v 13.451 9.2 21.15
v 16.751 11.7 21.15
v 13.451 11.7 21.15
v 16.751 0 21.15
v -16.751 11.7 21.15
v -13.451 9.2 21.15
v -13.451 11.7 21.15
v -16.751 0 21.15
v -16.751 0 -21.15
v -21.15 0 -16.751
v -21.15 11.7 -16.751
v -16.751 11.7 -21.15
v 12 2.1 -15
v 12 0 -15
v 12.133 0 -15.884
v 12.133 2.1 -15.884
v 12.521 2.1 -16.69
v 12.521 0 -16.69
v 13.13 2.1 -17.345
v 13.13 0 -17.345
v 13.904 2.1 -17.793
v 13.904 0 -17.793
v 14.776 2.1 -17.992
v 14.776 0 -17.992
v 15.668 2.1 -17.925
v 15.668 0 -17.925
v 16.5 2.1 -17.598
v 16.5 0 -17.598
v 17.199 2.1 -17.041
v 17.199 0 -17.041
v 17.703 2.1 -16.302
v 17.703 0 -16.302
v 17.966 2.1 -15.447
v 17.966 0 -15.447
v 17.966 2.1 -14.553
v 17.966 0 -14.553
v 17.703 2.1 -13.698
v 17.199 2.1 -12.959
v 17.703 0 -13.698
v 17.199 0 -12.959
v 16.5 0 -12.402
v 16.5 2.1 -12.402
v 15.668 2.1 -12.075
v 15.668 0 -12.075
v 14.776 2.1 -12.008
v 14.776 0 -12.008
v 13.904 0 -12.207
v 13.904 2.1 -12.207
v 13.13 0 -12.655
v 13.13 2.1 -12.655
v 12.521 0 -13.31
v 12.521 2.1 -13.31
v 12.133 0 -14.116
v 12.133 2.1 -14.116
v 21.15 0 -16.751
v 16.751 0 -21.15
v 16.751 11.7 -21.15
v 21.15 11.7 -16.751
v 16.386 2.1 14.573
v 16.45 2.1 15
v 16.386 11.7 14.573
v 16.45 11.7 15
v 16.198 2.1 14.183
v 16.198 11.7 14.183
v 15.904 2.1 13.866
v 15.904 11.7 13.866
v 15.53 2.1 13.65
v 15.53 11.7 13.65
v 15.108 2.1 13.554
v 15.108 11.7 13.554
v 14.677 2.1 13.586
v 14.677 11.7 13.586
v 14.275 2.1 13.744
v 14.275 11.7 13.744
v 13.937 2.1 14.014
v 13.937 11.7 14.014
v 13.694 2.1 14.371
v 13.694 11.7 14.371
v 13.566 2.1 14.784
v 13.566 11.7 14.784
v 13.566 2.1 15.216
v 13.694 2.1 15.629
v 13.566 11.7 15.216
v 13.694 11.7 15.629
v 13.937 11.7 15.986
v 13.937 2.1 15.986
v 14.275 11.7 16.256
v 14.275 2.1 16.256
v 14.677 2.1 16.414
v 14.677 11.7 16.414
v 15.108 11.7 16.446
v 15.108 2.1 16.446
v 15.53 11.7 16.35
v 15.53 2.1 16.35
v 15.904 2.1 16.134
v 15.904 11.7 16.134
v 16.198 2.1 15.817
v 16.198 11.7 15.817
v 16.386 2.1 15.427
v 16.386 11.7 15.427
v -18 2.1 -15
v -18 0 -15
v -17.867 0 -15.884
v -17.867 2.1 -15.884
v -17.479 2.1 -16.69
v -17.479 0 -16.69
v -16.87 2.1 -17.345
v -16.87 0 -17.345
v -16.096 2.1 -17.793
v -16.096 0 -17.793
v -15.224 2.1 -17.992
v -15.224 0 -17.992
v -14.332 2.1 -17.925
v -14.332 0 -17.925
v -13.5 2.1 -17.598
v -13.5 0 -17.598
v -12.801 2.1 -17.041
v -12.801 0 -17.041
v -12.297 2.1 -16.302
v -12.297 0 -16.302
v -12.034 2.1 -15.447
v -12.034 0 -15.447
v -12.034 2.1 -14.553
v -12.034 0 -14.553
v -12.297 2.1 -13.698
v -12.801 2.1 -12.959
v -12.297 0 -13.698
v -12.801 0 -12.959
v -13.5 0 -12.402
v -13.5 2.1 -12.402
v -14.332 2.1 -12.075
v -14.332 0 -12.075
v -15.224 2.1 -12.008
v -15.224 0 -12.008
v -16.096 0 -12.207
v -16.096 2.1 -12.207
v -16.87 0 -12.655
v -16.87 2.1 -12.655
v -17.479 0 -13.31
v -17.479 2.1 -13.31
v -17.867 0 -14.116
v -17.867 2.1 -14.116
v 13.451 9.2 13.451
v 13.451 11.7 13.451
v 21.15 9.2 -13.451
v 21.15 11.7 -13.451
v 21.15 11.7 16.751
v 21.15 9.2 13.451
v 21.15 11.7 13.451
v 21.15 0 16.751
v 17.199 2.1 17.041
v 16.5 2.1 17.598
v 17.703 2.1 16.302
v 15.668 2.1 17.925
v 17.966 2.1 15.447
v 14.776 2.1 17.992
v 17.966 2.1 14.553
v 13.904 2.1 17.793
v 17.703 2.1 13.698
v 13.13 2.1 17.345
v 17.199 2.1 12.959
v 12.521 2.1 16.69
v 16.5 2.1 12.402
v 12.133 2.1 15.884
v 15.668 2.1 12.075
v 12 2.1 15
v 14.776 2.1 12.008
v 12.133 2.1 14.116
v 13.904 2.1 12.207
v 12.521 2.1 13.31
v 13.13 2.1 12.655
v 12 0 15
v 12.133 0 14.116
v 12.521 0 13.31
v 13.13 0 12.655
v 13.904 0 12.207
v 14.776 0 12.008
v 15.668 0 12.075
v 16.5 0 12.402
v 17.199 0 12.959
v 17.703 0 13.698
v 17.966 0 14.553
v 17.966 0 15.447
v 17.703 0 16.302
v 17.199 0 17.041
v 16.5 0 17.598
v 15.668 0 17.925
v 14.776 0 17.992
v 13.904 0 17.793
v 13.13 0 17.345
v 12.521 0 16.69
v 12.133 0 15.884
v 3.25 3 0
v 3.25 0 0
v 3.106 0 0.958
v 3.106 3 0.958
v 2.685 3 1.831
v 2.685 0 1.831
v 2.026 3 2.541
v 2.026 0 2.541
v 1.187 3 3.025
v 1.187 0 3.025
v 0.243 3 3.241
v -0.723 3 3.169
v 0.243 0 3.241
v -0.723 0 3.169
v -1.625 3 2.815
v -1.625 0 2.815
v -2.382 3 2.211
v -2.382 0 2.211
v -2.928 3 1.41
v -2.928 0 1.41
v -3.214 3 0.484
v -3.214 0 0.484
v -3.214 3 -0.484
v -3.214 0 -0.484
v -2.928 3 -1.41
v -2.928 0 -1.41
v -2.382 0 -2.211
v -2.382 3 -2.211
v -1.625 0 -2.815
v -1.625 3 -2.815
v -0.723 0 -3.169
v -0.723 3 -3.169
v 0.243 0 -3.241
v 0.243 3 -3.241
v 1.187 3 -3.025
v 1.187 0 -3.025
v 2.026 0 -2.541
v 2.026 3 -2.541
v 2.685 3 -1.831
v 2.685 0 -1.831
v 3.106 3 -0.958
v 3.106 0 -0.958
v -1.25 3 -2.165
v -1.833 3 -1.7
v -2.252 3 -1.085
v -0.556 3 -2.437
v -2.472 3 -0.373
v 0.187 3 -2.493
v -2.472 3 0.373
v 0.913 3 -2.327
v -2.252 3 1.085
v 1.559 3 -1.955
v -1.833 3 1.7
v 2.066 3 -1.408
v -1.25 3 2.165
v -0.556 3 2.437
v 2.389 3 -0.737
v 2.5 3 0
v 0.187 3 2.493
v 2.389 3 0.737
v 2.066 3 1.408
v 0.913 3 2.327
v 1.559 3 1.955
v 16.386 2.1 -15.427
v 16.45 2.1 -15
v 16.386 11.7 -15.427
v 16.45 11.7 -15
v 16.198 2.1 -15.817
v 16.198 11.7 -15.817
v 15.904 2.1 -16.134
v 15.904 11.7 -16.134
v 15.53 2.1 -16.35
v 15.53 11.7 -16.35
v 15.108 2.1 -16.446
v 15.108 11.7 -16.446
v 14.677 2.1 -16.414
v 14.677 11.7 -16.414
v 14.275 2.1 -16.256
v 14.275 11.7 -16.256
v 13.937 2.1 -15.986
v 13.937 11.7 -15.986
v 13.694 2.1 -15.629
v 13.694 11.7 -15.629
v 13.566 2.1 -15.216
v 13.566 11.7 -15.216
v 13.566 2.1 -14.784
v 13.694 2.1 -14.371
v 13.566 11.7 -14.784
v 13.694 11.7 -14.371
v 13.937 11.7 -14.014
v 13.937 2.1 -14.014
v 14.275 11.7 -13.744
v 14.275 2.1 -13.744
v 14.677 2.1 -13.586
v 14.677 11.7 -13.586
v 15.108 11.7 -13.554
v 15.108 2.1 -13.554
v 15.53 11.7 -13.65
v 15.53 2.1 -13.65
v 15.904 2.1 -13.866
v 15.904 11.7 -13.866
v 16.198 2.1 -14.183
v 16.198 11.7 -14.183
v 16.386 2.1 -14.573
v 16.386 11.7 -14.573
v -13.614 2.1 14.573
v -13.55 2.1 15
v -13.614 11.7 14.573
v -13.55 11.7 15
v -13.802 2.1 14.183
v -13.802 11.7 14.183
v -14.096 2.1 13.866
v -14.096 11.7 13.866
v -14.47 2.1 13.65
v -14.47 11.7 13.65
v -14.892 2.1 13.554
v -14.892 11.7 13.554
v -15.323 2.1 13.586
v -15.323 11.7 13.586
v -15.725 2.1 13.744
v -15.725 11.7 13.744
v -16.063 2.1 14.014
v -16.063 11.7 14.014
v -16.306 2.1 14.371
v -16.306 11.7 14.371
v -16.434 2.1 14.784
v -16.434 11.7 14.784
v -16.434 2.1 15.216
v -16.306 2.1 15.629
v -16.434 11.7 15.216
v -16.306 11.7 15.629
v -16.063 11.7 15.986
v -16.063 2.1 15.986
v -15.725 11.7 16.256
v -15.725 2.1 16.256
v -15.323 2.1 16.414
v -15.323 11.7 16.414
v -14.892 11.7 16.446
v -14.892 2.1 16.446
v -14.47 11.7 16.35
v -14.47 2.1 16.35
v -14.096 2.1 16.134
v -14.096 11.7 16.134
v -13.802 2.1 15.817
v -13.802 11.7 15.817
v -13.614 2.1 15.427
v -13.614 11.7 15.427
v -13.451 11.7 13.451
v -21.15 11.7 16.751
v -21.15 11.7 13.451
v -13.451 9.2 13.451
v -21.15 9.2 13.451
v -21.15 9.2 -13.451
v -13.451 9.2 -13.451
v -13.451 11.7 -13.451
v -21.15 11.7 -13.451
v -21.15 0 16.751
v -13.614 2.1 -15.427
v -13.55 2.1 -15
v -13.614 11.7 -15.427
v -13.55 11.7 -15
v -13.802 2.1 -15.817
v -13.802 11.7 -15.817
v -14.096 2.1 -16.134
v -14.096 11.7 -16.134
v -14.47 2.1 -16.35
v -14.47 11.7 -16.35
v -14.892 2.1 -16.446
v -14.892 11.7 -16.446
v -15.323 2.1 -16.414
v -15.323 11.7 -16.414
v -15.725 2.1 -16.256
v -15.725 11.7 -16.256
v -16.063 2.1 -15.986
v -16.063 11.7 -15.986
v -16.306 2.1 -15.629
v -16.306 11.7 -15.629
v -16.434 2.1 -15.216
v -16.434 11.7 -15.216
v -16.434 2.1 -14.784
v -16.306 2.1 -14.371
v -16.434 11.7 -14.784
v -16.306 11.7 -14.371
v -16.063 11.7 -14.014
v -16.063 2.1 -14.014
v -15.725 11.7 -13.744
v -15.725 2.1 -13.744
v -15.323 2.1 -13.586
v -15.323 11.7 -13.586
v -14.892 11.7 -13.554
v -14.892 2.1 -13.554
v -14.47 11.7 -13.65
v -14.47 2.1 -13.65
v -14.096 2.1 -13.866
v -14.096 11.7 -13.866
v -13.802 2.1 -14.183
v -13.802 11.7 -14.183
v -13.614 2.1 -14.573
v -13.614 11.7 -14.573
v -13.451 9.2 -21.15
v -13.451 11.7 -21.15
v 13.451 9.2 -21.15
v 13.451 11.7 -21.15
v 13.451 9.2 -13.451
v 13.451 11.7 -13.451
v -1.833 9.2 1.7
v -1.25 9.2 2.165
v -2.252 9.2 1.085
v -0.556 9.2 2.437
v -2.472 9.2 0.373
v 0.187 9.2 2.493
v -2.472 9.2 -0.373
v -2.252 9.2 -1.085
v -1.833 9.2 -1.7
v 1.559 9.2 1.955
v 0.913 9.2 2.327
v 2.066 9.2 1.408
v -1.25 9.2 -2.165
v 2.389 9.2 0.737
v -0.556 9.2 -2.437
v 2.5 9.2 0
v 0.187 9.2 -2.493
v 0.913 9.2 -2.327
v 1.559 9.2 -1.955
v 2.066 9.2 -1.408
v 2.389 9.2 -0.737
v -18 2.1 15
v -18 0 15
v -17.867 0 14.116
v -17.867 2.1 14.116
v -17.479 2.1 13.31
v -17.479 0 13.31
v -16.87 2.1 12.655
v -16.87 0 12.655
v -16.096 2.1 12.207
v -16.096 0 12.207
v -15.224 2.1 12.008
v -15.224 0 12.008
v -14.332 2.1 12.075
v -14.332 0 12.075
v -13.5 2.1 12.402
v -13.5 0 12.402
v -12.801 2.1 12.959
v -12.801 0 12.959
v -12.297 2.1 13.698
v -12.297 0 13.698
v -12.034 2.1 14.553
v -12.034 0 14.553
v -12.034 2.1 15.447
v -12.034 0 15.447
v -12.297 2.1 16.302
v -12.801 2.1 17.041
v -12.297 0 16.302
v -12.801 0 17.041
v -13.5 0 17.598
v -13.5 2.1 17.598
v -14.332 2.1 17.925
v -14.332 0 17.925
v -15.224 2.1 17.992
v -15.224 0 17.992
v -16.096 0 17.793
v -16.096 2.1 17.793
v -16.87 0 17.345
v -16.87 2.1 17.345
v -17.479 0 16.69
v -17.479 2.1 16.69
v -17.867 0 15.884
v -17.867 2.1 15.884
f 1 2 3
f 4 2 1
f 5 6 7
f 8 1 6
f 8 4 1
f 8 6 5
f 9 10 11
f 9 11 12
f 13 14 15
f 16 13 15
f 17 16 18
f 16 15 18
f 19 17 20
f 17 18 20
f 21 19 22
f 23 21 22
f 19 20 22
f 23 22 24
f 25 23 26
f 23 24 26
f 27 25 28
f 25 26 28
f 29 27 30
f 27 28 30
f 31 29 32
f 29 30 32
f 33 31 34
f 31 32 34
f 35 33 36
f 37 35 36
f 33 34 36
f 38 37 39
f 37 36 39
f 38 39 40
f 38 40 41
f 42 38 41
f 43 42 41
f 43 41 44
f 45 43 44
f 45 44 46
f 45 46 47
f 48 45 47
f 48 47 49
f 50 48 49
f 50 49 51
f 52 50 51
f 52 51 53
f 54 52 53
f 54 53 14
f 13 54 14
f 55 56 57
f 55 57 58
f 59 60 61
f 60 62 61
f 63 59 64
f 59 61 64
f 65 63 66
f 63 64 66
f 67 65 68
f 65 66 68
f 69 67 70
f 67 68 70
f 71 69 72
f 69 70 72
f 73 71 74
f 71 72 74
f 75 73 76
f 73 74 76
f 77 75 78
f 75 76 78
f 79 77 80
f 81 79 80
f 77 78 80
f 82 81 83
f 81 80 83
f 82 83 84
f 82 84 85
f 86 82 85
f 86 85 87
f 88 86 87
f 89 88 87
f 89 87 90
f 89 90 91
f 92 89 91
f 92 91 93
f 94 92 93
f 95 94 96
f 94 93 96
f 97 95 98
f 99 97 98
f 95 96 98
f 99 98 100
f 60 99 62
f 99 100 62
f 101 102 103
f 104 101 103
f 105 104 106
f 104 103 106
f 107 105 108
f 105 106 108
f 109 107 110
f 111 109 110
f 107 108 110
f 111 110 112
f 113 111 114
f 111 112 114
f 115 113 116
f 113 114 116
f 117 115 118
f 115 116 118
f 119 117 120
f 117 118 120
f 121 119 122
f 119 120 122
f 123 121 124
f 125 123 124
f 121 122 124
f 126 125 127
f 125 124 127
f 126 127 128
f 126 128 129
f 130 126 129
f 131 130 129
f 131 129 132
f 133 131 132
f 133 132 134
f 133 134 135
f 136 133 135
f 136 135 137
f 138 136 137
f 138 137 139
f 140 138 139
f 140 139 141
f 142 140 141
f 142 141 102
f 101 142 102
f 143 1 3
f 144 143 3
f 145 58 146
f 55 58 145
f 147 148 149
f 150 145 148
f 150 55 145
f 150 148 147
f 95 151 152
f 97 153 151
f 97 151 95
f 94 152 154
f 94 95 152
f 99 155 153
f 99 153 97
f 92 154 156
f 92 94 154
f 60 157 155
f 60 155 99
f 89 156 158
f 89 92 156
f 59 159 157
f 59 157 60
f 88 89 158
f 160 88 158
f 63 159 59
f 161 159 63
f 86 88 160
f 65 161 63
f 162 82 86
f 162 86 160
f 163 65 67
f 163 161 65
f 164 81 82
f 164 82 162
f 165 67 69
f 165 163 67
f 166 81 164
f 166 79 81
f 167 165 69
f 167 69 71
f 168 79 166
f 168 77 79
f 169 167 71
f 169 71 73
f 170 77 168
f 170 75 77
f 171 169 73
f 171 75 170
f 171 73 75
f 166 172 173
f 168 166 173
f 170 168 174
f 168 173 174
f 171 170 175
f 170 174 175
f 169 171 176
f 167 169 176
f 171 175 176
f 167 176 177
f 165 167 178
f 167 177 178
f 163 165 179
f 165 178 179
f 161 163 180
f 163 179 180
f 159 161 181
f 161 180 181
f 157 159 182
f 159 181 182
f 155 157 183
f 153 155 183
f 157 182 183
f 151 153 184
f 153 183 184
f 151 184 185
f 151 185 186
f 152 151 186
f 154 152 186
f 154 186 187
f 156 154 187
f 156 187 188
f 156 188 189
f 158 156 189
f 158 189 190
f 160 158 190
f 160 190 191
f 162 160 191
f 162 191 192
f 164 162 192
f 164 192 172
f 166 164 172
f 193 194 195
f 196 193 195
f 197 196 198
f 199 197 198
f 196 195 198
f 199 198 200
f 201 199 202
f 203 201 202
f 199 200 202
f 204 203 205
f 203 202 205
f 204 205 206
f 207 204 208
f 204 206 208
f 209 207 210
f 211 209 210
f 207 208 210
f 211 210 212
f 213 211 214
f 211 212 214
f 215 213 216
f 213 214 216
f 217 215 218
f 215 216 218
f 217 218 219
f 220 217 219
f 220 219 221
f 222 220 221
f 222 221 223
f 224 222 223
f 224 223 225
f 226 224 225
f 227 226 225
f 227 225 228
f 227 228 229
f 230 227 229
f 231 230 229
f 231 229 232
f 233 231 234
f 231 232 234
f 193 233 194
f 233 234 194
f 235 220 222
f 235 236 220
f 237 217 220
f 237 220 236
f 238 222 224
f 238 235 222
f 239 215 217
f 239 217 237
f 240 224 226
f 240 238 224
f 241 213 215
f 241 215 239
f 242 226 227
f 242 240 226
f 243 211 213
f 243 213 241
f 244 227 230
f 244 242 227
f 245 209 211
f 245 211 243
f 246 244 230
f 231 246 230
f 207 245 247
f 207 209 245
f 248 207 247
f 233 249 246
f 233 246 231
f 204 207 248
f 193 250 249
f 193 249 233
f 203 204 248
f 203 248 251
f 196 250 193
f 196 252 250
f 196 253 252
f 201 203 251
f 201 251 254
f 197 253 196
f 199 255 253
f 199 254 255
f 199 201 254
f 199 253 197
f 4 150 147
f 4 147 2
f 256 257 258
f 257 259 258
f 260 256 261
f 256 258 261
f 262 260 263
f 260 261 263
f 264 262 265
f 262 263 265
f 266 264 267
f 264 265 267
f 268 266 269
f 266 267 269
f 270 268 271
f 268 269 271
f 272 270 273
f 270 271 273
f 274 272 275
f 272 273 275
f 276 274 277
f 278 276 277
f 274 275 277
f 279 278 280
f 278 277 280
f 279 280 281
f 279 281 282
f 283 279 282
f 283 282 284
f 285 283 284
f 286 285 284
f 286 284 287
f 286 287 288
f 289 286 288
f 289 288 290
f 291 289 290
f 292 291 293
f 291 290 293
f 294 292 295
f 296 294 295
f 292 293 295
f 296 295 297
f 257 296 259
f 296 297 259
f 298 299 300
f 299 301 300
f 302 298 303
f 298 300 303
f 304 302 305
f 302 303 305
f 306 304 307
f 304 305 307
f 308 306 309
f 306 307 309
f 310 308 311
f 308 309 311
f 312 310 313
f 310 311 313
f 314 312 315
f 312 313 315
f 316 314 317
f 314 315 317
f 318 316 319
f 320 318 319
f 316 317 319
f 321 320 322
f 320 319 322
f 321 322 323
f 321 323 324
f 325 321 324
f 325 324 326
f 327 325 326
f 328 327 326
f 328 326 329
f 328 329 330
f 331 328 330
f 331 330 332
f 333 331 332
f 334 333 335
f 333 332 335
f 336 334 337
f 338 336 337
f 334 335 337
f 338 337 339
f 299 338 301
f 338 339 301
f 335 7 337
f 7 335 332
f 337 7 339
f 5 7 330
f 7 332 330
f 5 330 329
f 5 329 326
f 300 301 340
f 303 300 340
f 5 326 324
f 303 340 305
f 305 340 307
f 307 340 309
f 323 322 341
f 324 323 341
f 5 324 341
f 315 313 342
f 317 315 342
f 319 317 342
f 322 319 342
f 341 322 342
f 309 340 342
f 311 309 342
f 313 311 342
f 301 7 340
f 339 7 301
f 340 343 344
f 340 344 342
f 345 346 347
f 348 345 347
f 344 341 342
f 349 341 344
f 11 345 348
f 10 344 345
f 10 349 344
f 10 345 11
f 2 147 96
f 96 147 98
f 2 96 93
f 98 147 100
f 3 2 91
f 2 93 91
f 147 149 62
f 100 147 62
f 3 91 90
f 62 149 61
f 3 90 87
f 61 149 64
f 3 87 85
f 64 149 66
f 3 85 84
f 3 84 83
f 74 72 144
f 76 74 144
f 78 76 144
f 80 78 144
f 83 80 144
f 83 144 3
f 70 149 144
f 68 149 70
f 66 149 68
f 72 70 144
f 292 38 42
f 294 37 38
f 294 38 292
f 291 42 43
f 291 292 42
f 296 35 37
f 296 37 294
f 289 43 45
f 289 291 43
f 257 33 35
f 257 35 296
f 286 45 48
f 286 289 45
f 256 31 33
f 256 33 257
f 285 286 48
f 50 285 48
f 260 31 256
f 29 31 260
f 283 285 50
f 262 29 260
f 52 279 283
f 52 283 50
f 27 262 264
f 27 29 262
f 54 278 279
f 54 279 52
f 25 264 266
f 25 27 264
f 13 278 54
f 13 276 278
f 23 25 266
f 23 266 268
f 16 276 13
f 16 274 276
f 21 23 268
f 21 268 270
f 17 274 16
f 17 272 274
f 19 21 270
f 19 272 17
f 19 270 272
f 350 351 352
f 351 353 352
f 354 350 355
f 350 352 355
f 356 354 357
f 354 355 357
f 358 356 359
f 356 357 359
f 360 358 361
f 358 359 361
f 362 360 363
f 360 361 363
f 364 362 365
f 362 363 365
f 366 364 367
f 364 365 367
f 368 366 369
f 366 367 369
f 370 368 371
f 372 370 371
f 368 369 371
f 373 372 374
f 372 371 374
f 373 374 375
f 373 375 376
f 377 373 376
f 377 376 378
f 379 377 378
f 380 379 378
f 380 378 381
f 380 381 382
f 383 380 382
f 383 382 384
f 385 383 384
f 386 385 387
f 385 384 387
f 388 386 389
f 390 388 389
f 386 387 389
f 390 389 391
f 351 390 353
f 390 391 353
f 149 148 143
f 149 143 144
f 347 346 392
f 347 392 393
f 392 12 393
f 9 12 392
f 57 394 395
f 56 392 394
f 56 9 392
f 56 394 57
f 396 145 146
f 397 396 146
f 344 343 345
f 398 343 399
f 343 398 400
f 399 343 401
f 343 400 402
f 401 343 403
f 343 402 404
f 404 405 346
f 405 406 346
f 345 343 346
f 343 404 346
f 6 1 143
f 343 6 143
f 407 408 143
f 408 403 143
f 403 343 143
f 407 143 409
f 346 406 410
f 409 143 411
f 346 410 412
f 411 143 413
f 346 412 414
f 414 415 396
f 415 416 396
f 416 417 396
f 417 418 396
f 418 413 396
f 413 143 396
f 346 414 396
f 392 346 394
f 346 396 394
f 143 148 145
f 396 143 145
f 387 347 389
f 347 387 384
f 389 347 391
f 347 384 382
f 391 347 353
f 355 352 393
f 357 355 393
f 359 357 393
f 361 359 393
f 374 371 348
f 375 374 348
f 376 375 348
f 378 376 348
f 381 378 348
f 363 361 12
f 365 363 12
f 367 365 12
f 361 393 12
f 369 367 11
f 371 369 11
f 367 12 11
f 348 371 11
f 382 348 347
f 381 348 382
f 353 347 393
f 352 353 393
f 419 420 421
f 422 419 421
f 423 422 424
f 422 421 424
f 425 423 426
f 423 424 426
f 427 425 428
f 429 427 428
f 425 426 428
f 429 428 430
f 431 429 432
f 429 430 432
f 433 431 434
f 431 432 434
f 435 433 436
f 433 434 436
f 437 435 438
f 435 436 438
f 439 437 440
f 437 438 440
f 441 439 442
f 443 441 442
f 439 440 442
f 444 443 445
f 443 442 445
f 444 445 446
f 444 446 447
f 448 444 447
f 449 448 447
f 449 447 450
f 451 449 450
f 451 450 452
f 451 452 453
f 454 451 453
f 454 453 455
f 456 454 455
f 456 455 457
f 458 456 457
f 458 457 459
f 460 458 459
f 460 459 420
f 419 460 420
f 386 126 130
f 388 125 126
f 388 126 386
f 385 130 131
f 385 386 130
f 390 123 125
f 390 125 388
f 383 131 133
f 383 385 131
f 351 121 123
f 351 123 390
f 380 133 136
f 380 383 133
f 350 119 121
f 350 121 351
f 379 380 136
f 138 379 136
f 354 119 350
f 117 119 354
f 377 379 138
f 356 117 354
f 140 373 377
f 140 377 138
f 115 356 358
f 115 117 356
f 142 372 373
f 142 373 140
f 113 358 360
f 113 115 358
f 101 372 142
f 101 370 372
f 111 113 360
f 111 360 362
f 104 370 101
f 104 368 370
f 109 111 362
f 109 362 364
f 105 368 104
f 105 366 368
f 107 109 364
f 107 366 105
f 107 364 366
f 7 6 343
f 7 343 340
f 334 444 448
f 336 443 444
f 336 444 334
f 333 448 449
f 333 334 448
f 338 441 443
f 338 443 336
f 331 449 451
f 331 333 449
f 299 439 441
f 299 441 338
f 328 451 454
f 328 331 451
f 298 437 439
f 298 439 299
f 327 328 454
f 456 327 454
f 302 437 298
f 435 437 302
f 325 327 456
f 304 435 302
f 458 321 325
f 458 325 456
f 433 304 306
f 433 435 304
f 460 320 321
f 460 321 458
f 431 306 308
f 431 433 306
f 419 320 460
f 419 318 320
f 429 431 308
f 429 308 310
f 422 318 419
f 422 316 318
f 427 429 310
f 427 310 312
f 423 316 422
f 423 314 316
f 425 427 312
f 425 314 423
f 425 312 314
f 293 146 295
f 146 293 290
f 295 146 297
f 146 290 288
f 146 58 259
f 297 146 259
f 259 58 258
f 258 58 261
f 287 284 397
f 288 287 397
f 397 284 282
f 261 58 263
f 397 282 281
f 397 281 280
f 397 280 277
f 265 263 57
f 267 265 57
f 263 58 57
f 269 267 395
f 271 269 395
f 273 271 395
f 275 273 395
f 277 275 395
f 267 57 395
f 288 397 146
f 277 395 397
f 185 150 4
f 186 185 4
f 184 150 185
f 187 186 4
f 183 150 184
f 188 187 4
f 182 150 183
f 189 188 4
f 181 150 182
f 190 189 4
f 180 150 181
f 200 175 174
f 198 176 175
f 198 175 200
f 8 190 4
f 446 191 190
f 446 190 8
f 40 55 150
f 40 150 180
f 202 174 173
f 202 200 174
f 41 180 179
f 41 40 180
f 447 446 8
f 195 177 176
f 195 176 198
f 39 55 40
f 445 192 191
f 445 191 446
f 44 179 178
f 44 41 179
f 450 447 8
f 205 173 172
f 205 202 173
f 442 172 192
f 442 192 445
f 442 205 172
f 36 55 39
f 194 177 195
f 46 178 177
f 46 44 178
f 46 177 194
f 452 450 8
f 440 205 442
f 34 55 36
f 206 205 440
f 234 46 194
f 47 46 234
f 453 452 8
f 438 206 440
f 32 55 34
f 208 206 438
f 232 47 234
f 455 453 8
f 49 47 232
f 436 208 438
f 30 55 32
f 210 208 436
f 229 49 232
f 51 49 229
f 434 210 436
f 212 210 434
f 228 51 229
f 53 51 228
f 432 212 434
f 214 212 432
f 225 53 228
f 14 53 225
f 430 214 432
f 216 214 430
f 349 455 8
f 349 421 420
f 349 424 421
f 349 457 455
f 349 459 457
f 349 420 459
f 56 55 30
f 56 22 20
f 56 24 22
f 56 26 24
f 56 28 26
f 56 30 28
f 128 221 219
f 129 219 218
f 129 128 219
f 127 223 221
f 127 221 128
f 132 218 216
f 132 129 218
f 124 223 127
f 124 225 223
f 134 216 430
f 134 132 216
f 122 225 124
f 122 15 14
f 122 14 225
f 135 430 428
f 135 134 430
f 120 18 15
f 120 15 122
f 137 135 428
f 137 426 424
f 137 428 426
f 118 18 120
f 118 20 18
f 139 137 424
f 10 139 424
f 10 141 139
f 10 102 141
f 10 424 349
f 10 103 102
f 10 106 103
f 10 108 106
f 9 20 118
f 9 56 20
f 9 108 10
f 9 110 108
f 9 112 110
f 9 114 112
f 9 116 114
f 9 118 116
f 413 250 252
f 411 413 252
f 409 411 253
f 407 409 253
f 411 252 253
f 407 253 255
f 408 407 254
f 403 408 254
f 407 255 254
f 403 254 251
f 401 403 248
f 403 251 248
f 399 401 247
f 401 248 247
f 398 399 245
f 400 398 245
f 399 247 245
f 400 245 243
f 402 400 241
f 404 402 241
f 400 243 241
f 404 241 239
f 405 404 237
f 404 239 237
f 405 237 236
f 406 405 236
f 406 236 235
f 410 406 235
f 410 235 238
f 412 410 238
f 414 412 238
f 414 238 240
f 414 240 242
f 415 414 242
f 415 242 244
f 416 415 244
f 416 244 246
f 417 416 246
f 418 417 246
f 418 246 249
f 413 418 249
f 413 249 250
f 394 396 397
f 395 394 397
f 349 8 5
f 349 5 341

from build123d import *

# Parameters (mm, degrees)
BOSS_EXTRUDE1_DEPTH                                = 11.7
SKETCH12_W                                         = 26.901846944
SKETCH12_H                                         = 2.5
CUT_EXTRUDE6_DEPTH                                 = 43.3
SKETCH13_W                                         = 26.901846944
SKETCH13_H                                         = 2.5
CUT_EXTRUDE7_DEPTH                                 = 43.3
SKETCH14_R                                         = 3.25
CUT_EXTRUDE8_DEPTH                                 = 3
SKETCH15_R                                         = 2.5
CUT_EXTRUDE9_DEPTH                                 = 9.7
CBORE_FOR_M2_5_PAN_HEAD_MACHINE_SCREW1_D           = 2.9
CBORE_FOR_M2_5_PAN_HEAD_MACHINE_SCREW1_CBORE_D     = 6
CBORE_FOR_M2_5_PAN_HEAD_MACHINE_SCREW1_CBORE_DEPTH = 2.1


with BuildPart() as part:
    # Sketch1 → Boss-Extrude1 (new body)
    with BuildSketch(Plane(origin=(0, 0, 0), x_dir=(1, 0, 0), z_dir=(0, 1, 0))):
        Polygon((-21.15, 16.750923472), (-16.750923472, 21.15), (16.750923472, 21.15), (21.15, 16.750923472), (21.15, -16.750923472), (16.750923472, -21.15), (-16.750923472, -21.15), (-21.15, -16.750923472), align=None)
    extrude(amount=BOSS_EXTRUDE1_DEPTH)

    # Sketch12 → Cut-Extrude6 (cut, through all)
    with BuildSketch(Plane(origin=(21.15, 0, 0), x_dir=(0, 0, -1), z_dir=(1, 0, 0))):
        with Locations((0, 10.45)):
            Rectangle(SKETCH12_W, SKETCH12_H)
    extrude(amount=-CUT_EXTRUDE6_DEPTH, mode=Mode.SUBTRACT)

    # Sketch13 → Cut-Extrude7 (cut, through all)
    with BuildSketch(Plane.XY.offset(21.15)):
        with Locations((0, 10.45)):
            Rectangle(SKETCH13_W, SKETCH13_H)
    extrude(amount=-CUT_EXTRUDE7_DEPTH, mode=Mode.SUBTRACT)

    # Sketch14 → Cut-Extrude8 (cut)
    with BuildSketch(Plane.XZ):
        Circle(SKETCH14_R)
    extrude(amount=-CUT_EXTRUDE8_DEPTH, mode=Mode.SUBTRACT)

    # Sketch15 → Cut-Extrude9 (cut, through all)
    with BuildSketch(Plane.XZ.offset(-3)):
        Circle(SKETCH15_R)
    extrude(amount=-CUT_EXTRUDE9_DEPTH, mode=Mode.SUBTRACT)

    # CBORE for M2.5 Pan Head Machine Screw1 (through all)
    with Locations(Plane(origin=(0, 0, 0), x_dir=(-1, 0, 0), z_dir=(0, -1, 0))):
        with Locations((15, -15), (-15, -15), (-15, 15), (15, 15)):
            CounterBoreHole(CBORE_FOR_M2_5_PAN_HEAD_MACHINE_SCREW1_D / 2, CBORE_FOR_M2_5_PAN_HEAD_MACHINE_SCREW1_CBORE_D / 2, CBORE_FOR_M2_5_PAN_HEAD_MACHINE_SCREW1_CBORE_DEPTH)


solid = part.part
